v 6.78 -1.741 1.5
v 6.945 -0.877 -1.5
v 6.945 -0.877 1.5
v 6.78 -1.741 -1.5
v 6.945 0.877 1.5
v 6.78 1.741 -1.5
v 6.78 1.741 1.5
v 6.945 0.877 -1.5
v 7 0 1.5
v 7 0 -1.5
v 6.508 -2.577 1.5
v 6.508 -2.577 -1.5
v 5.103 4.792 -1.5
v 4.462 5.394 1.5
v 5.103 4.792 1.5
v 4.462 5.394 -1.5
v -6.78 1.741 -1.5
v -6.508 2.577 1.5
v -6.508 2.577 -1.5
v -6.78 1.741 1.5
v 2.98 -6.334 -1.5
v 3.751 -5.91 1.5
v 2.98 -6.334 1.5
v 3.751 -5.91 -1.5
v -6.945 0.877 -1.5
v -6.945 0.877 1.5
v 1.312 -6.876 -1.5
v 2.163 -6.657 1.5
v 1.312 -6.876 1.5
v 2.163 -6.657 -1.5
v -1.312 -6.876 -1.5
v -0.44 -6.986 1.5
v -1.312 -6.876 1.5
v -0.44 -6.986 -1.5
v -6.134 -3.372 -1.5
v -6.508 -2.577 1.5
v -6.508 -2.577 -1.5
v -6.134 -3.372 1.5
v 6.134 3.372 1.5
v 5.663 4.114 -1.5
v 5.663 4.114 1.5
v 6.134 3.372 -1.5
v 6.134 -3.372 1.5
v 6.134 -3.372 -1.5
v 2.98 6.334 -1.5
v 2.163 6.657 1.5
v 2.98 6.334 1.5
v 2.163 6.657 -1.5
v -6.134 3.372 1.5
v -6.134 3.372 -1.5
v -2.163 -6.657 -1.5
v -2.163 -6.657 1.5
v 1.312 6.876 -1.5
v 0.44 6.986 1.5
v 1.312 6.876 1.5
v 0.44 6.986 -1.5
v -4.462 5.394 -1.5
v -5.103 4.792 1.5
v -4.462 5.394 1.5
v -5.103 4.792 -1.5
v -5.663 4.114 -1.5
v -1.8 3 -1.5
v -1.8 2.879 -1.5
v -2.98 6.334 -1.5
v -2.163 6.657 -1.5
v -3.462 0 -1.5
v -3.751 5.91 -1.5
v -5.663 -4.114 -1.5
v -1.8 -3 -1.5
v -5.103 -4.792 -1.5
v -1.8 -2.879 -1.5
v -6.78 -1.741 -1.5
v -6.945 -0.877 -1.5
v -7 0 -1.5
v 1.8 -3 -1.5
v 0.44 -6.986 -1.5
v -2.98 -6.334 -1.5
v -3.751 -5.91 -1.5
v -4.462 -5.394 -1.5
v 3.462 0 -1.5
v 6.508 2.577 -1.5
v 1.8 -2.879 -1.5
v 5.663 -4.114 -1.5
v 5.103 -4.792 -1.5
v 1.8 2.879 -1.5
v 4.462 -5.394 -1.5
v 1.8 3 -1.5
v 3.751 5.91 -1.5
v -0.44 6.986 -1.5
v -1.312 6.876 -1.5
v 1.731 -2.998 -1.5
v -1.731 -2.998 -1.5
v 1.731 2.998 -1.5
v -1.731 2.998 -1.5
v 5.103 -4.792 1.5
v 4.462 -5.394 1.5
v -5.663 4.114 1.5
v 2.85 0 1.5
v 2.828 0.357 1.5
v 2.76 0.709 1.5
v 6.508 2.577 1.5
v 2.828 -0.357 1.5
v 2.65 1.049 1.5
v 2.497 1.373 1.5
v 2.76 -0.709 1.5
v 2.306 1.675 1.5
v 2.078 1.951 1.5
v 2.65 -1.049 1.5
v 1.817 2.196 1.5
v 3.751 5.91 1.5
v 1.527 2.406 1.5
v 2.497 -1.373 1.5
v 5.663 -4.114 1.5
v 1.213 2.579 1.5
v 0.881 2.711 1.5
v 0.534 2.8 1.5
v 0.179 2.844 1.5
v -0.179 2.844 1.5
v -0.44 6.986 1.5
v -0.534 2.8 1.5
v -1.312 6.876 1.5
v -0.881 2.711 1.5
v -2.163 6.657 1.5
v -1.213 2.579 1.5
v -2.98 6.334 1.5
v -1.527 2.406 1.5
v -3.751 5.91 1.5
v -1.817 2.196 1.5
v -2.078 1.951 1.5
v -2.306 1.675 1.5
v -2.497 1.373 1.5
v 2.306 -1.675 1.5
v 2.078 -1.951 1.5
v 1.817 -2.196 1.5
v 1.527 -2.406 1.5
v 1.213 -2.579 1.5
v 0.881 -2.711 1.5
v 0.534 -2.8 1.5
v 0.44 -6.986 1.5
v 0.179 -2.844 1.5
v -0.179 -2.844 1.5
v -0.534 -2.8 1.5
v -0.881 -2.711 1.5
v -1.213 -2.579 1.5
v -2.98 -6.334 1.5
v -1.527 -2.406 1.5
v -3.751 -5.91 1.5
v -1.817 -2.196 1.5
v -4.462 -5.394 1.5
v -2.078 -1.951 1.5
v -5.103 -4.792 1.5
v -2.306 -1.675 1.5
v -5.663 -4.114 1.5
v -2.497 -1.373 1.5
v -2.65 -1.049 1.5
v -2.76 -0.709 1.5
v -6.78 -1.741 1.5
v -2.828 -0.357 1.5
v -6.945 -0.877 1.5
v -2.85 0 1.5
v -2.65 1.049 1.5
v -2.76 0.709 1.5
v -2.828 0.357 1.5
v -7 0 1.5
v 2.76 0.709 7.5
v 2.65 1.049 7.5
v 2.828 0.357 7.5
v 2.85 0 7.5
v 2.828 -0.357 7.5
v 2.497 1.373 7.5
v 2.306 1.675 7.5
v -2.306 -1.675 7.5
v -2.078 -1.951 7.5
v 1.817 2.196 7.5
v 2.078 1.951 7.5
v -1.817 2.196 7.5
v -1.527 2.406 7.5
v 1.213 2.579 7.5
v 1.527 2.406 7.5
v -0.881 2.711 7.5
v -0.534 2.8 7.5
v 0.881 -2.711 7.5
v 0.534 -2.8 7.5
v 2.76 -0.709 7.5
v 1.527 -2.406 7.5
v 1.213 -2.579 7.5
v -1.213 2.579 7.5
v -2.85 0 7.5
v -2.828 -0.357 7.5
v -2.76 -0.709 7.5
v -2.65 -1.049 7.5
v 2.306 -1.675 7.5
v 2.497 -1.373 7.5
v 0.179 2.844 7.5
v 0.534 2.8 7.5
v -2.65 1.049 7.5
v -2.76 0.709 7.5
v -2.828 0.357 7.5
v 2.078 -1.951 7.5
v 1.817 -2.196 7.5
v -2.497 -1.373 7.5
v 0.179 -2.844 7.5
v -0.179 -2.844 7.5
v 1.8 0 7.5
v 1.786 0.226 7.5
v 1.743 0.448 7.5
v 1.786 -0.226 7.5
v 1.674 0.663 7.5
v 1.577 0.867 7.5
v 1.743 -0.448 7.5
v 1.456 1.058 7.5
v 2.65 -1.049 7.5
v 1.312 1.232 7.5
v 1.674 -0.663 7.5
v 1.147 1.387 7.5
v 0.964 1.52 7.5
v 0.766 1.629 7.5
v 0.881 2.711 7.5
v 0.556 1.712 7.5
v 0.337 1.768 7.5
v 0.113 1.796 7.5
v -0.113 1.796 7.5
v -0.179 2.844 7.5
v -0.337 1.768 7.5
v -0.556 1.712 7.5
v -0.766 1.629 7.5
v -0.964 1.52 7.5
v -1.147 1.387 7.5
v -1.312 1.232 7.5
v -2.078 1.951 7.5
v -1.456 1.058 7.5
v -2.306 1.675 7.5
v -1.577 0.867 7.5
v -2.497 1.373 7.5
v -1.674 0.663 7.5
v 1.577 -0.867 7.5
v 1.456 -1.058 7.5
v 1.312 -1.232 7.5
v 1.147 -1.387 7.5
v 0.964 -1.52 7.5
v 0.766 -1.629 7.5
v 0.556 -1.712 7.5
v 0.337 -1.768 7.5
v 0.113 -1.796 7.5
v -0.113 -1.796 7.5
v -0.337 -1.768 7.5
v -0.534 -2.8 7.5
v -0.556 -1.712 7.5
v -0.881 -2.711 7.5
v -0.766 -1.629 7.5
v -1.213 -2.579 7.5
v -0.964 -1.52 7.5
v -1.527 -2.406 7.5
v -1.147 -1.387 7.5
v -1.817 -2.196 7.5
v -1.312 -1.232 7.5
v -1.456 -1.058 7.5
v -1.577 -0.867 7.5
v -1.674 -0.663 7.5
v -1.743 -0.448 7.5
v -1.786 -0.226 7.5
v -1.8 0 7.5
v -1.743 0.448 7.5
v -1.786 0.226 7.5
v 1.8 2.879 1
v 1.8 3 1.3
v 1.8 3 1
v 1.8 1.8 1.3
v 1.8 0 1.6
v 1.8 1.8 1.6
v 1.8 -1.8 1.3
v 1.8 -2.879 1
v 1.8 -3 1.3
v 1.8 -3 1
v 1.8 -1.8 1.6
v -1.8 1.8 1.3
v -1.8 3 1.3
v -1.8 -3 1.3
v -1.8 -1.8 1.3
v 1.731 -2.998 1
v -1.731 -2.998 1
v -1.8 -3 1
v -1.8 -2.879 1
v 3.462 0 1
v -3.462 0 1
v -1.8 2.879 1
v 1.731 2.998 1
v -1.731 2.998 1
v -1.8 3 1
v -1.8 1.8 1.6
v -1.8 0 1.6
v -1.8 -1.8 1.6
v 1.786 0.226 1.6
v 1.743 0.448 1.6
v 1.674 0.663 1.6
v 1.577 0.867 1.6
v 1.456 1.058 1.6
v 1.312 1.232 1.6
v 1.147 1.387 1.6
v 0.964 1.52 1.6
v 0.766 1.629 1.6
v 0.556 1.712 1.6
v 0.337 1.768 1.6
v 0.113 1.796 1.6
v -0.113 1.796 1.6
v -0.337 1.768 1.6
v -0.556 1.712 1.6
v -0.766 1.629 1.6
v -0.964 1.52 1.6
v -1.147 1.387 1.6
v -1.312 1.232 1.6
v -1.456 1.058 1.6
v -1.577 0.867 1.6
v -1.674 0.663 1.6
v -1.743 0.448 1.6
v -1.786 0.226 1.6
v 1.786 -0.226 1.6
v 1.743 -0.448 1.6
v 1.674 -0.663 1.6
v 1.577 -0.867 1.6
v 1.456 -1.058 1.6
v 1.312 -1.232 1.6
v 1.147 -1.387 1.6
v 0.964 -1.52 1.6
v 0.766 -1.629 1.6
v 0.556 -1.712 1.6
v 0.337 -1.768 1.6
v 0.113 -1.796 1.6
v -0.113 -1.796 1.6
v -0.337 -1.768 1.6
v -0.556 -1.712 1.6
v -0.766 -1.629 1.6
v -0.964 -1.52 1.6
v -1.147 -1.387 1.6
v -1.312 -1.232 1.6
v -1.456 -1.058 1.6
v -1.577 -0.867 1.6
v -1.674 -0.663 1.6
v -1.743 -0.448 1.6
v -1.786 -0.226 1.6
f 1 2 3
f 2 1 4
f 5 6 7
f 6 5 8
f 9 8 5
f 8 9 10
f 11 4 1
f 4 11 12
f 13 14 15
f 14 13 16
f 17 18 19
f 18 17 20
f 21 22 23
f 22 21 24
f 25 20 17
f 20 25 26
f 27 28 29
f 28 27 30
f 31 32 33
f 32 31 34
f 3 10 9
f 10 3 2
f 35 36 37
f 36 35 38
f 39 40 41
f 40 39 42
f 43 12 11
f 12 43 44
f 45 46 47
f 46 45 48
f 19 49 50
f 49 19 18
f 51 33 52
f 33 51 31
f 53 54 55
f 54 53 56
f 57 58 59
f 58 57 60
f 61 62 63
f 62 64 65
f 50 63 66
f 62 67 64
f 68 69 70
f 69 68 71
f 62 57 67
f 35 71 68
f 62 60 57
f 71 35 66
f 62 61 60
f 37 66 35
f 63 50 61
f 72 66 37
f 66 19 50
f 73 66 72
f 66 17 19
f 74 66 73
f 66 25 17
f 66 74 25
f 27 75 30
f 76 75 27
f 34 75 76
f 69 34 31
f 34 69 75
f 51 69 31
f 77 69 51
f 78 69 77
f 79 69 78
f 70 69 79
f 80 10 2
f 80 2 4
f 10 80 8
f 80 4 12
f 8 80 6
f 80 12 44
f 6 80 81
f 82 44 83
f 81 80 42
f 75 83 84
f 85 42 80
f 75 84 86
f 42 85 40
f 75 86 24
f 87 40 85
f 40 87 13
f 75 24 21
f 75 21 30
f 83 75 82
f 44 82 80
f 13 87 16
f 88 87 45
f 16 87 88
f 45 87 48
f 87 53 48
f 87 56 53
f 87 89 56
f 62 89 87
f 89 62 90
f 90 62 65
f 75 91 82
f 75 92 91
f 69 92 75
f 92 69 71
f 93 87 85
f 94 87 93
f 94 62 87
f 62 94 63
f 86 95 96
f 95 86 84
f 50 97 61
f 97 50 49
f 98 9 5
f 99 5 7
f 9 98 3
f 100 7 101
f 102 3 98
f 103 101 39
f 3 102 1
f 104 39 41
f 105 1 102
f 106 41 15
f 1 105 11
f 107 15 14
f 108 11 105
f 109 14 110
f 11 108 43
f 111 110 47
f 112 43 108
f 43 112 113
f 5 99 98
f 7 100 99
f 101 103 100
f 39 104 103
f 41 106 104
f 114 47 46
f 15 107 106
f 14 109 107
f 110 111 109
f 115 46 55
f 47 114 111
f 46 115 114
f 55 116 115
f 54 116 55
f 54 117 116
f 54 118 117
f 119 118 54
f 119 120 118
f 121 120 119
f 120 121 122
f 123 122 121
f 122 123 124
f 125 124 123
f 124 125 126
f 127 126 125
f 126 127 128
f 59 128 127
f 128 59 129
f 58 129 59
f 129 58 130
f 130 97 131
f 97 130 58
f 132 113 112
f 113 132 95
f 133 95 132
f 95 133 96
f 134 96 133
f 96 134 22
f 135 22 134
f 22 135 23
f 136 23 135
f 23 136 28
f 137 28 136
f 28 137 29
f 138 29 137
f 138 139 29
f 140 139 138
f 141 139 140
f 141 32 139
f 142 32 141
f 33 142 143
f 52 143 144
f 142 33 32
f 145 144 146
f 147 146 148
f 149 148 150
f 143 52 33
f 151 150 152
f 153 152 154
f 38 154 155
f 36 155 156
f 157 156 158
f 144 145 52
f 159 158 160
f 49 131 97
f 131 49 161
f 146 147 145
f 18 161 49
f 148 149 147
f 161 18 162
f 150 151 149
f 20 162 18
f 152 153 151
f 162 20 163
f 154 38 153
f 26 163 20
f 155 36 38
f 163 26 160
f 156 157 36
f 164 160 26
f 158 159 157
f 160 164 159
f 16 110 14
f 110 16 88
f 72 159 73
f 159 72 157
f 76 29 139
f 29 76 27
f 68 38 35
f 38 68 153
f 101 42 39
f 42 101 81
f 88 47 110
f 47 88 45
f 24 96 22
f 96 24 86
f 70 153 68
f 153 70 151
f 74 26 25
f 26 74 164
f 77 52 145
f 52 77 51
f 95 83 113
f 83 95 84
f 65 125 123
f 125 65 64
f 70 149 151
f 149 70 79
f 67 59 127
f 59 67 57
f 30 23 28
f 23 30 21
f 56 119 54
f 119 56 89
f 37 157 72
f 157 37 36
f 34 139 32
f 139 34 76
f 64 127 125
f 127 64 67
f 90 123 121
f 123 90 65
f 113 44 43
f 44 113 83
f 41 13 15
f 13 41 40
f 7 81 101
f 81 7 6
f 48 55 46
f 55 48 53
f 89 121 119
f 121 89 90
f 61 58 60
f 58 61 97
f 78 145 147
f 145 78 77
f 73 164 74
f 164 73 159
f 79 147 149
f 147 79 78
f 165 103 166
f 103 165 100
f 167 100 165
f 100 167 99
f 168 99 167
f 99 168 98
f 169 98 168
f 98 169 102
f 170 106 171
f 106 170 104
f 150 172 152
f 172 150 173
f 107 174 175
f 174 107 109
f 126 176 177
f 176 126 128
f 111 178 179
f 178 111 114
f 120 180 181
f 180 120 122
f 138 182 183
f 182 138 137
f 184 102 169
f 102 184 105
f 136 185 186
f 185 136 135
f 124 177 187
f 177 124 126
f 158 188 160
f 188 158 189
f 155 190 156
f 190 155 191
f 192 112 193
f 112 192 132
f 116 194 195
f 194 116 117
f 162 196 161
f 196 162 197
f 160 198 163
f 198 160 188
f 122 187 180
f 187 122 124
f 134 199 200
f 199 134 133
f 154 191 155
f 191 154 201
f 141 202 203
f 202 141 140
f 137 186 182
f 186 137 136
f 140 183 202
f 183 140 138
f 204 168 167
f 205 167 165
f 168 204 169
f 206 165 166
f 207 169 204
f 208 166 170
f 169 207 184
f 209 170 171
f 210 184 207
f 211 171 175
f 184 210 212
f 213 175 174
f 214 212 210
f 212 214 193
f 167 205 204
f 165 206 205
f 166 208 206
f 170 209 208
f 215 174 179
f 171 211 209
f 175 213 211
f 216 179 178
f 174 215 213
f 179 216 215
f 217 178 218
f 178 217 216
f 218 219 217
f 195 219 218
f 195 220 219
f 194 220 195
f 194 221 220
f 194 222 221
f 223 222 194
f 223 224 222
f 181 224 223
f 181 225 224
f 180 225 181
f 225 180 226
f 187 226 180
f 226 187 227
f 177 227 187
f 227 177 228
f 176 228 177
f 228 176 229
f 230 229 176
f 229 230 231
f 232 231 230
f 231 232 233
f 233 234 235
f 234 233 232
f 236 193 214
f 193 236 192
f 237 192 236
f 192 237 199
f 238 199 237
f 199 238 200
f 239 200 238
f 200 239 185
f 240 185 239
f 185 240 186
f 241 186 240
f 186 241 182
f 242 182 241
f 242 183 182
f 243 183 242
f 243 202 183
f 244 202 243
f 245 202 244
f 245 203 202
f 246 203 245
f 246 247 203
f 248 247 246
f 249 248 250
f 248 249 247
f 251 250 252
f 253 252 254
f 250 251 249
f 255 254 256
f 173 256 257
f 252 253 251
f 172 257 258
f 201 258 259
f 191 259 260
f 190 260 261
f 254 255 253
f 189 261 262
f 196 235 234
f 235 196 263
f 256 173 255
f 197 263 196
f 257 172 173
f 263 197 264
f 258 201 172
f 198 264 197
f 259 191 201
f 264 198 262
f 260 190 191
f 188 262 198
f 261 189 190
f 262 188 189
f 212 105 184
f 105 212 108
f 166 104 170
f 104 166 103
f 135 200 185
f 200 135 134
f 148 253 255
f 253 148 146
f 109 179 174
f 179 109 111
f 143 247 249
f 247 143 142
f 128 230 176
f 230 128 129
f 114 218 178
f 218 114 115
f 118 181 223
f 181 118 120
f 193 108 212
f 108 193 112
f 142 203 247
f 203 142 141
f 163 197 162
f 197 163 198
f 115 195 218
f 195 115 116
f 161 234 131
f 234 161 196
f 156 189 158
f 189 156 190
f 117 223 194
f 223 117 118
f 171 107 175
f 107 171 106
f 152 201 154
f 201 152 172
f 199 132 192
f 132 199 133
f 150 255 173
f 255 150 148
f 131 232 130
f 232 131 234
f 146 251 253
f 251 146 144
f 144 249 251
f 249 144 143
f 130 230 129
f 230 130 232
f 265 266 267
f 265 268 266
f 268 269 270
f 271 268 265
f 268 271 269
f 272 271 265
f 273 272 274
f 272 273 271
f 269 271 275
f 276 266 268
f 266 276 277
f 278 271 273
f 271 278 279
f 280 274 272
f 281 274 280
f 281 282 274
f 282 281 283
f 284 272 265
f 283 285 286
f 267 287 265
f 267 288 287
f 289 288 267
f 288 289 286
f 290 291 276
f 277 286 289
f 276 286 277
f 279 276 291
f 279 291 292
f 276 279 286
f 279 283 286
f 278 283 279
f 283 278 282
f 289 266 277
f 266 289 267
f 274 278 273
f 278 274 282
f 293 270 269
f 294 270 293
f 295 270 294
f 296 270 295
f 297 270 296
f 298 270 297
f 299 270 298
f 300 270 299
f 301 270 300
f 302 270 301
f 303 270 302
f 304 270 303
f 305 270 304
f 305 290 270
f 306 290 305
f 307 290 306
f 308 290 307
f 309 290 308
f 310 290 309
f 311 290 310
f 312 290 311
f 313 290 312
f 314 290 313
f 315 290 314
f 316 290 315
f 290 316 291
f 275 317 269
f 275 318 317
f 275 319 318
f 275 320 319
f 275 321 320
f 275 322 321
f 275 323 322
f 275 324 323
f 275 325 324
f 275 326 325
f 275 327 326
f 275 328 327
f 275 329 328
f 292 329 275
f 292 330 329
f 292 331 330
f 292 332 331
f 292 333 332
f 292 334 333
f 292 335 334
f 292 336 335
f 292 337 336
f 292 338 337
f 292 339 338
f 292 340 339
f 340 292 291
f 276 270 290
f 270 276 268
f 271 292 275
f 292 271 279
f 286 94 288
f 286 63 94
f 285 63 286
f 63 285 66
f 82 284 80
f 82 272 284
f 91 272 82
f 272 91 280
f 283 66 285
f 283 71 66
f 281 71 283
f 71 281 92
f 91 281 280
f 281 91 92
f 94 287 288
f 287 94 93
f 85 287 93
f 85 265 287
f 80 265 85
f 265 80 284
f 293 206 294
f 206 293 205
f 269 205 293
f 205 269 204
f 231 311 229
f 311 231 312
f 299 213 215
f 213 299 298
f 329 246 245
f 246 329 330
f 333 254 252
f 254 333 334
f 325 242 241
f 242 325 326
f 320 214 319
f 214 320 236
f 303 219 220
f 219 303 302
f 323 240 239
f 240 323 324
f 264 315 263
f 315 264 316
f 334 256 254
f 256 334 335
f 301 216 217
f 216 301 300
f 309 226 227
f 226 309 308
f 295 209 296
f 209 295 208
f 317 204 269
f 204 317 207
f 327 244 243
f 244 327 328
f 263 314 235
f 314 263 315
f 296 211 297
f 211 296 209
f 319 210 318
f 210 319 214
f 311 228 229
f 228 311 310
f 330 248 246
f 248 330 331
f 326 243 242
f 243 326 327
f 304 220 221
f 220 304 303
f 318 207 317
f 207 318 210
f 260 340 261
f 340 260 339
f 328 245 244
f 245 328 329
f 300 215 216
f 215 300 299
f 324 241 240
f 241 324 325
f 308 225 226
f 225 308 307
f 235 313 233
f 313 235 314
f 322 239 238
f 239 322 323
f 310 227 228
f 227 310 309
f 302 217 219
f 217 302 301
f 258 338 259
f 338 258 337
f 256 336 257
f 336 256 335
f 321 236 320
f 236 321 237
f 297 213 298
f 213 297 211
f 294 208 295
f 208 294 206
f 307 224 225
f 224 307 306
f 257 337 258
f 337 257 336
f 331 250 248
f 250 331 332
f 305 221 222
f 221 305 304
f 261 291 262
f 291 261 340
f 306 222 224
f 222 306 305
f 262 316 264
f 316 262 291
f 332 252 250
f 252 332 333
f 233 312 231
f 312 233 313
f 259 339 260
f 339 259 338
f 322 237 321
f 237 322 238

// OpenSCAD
$fn = 50;


difference() {
	union() {
		translate(v = [0, 0, -1.5000000000]) {
			cylinder(h = 3, r = 7.0000000000);
		}
		translate(v = [0, 0, -1.5000000000]) {
			cylinder(h = 9, r = 2.8500000000);
		}
	}
	union() {
		translate(v = [0, 0, -1.5000000000]) {
			rotate(a = [0, 0, 0]) {
				difference() {
					union() {
						translate(v = [-1.8000000000, -3.0000000000, -0.3000000000]) {
							cube(size = [3.6000000000, 6.0000000000, 0.3000000000]);
						}
						translate(v = [-1.8000000000, -1.8000000000, -0.6000000000]) {
							cube(size = [3.6000000000, 3.6000000000, 0.3000000000]);
						}
						translate(v = [-1.8000000000, -3.0000000000, 2.5000000000]) {
							cube(size = [3.6000000000, 6.0000000000, 0.3000000000]);
						}
						translate(v = [-1.8000000000, -1.8000000000, 2.8000000000]) {
							cube(size = [3.6000000000, 3.6000000000, 0.3000000000]);
						}
						linear_extrude(height = 2.5000000000) {
							polygon(points = [[3.4620000000, 0.0000000000], [1.7310000000, 2.9981799479], [-1.7310000000, 2.9981799479], [-3.4620000000, 0.0000000000], [-1.7310000000, -2.9981799479], [1.7310000000, -2.9981799479]]);
						}
						translate(v = [-1.8000000000, -3.0000000000, -0.3000000000]) {
							cube(size = [3.6000000000, 6.0000000000, 0.3000000000]);
						}
						translate(v = [-1.8000000000, -1.8000000000, -0.6000000000]) {
							cube(size = [3.6000000000, 3.6000000000, 0.3000000000]);
						}
						translate(v = [-1.8000000000, -3.0000000000, 2.5000000000]) {
							cube(size = [3.6000000000, 6.0000000000, 0.3000000000]);
						}
						translate(v = [-1.8000000000, -1.8000000000, 2.8000000000]) {
							cube(size = [3.6000000000, 3.6000000000, 0.3000000000]);
						}
						translate(v = [-1.8000000000, -3.0000000000, -0.3000000000]) {
							cube(size = [3.6000000000, 6.0000000000, 0.3000000000]);
						}
						translate(v = [-1.8000000000, -1.8000000000, -0.6000000000]) {
							cube(size = [3.6000000000, 3.6000000000, 0.3000000000]);
						}
						translate(v = [-1.8000000000, -3.0000000000, 2.5000000000]) {
							cube(size = [3.6000000000, 6.0000000000, 0.3000000000]);
						}
						translate(v = [-1.8000000000, -1.8000000000, 2.8000000000]) {
							cube(size = [3.6000000000, 3.6000000000, 0.3000000000]);
						}
					}
					union();
				}
			}
		}
		translate(v = [0, 0, -50.0000000000]) {
			cylinder(h = 100, r = 1.8000000000);
		}
	}
}
